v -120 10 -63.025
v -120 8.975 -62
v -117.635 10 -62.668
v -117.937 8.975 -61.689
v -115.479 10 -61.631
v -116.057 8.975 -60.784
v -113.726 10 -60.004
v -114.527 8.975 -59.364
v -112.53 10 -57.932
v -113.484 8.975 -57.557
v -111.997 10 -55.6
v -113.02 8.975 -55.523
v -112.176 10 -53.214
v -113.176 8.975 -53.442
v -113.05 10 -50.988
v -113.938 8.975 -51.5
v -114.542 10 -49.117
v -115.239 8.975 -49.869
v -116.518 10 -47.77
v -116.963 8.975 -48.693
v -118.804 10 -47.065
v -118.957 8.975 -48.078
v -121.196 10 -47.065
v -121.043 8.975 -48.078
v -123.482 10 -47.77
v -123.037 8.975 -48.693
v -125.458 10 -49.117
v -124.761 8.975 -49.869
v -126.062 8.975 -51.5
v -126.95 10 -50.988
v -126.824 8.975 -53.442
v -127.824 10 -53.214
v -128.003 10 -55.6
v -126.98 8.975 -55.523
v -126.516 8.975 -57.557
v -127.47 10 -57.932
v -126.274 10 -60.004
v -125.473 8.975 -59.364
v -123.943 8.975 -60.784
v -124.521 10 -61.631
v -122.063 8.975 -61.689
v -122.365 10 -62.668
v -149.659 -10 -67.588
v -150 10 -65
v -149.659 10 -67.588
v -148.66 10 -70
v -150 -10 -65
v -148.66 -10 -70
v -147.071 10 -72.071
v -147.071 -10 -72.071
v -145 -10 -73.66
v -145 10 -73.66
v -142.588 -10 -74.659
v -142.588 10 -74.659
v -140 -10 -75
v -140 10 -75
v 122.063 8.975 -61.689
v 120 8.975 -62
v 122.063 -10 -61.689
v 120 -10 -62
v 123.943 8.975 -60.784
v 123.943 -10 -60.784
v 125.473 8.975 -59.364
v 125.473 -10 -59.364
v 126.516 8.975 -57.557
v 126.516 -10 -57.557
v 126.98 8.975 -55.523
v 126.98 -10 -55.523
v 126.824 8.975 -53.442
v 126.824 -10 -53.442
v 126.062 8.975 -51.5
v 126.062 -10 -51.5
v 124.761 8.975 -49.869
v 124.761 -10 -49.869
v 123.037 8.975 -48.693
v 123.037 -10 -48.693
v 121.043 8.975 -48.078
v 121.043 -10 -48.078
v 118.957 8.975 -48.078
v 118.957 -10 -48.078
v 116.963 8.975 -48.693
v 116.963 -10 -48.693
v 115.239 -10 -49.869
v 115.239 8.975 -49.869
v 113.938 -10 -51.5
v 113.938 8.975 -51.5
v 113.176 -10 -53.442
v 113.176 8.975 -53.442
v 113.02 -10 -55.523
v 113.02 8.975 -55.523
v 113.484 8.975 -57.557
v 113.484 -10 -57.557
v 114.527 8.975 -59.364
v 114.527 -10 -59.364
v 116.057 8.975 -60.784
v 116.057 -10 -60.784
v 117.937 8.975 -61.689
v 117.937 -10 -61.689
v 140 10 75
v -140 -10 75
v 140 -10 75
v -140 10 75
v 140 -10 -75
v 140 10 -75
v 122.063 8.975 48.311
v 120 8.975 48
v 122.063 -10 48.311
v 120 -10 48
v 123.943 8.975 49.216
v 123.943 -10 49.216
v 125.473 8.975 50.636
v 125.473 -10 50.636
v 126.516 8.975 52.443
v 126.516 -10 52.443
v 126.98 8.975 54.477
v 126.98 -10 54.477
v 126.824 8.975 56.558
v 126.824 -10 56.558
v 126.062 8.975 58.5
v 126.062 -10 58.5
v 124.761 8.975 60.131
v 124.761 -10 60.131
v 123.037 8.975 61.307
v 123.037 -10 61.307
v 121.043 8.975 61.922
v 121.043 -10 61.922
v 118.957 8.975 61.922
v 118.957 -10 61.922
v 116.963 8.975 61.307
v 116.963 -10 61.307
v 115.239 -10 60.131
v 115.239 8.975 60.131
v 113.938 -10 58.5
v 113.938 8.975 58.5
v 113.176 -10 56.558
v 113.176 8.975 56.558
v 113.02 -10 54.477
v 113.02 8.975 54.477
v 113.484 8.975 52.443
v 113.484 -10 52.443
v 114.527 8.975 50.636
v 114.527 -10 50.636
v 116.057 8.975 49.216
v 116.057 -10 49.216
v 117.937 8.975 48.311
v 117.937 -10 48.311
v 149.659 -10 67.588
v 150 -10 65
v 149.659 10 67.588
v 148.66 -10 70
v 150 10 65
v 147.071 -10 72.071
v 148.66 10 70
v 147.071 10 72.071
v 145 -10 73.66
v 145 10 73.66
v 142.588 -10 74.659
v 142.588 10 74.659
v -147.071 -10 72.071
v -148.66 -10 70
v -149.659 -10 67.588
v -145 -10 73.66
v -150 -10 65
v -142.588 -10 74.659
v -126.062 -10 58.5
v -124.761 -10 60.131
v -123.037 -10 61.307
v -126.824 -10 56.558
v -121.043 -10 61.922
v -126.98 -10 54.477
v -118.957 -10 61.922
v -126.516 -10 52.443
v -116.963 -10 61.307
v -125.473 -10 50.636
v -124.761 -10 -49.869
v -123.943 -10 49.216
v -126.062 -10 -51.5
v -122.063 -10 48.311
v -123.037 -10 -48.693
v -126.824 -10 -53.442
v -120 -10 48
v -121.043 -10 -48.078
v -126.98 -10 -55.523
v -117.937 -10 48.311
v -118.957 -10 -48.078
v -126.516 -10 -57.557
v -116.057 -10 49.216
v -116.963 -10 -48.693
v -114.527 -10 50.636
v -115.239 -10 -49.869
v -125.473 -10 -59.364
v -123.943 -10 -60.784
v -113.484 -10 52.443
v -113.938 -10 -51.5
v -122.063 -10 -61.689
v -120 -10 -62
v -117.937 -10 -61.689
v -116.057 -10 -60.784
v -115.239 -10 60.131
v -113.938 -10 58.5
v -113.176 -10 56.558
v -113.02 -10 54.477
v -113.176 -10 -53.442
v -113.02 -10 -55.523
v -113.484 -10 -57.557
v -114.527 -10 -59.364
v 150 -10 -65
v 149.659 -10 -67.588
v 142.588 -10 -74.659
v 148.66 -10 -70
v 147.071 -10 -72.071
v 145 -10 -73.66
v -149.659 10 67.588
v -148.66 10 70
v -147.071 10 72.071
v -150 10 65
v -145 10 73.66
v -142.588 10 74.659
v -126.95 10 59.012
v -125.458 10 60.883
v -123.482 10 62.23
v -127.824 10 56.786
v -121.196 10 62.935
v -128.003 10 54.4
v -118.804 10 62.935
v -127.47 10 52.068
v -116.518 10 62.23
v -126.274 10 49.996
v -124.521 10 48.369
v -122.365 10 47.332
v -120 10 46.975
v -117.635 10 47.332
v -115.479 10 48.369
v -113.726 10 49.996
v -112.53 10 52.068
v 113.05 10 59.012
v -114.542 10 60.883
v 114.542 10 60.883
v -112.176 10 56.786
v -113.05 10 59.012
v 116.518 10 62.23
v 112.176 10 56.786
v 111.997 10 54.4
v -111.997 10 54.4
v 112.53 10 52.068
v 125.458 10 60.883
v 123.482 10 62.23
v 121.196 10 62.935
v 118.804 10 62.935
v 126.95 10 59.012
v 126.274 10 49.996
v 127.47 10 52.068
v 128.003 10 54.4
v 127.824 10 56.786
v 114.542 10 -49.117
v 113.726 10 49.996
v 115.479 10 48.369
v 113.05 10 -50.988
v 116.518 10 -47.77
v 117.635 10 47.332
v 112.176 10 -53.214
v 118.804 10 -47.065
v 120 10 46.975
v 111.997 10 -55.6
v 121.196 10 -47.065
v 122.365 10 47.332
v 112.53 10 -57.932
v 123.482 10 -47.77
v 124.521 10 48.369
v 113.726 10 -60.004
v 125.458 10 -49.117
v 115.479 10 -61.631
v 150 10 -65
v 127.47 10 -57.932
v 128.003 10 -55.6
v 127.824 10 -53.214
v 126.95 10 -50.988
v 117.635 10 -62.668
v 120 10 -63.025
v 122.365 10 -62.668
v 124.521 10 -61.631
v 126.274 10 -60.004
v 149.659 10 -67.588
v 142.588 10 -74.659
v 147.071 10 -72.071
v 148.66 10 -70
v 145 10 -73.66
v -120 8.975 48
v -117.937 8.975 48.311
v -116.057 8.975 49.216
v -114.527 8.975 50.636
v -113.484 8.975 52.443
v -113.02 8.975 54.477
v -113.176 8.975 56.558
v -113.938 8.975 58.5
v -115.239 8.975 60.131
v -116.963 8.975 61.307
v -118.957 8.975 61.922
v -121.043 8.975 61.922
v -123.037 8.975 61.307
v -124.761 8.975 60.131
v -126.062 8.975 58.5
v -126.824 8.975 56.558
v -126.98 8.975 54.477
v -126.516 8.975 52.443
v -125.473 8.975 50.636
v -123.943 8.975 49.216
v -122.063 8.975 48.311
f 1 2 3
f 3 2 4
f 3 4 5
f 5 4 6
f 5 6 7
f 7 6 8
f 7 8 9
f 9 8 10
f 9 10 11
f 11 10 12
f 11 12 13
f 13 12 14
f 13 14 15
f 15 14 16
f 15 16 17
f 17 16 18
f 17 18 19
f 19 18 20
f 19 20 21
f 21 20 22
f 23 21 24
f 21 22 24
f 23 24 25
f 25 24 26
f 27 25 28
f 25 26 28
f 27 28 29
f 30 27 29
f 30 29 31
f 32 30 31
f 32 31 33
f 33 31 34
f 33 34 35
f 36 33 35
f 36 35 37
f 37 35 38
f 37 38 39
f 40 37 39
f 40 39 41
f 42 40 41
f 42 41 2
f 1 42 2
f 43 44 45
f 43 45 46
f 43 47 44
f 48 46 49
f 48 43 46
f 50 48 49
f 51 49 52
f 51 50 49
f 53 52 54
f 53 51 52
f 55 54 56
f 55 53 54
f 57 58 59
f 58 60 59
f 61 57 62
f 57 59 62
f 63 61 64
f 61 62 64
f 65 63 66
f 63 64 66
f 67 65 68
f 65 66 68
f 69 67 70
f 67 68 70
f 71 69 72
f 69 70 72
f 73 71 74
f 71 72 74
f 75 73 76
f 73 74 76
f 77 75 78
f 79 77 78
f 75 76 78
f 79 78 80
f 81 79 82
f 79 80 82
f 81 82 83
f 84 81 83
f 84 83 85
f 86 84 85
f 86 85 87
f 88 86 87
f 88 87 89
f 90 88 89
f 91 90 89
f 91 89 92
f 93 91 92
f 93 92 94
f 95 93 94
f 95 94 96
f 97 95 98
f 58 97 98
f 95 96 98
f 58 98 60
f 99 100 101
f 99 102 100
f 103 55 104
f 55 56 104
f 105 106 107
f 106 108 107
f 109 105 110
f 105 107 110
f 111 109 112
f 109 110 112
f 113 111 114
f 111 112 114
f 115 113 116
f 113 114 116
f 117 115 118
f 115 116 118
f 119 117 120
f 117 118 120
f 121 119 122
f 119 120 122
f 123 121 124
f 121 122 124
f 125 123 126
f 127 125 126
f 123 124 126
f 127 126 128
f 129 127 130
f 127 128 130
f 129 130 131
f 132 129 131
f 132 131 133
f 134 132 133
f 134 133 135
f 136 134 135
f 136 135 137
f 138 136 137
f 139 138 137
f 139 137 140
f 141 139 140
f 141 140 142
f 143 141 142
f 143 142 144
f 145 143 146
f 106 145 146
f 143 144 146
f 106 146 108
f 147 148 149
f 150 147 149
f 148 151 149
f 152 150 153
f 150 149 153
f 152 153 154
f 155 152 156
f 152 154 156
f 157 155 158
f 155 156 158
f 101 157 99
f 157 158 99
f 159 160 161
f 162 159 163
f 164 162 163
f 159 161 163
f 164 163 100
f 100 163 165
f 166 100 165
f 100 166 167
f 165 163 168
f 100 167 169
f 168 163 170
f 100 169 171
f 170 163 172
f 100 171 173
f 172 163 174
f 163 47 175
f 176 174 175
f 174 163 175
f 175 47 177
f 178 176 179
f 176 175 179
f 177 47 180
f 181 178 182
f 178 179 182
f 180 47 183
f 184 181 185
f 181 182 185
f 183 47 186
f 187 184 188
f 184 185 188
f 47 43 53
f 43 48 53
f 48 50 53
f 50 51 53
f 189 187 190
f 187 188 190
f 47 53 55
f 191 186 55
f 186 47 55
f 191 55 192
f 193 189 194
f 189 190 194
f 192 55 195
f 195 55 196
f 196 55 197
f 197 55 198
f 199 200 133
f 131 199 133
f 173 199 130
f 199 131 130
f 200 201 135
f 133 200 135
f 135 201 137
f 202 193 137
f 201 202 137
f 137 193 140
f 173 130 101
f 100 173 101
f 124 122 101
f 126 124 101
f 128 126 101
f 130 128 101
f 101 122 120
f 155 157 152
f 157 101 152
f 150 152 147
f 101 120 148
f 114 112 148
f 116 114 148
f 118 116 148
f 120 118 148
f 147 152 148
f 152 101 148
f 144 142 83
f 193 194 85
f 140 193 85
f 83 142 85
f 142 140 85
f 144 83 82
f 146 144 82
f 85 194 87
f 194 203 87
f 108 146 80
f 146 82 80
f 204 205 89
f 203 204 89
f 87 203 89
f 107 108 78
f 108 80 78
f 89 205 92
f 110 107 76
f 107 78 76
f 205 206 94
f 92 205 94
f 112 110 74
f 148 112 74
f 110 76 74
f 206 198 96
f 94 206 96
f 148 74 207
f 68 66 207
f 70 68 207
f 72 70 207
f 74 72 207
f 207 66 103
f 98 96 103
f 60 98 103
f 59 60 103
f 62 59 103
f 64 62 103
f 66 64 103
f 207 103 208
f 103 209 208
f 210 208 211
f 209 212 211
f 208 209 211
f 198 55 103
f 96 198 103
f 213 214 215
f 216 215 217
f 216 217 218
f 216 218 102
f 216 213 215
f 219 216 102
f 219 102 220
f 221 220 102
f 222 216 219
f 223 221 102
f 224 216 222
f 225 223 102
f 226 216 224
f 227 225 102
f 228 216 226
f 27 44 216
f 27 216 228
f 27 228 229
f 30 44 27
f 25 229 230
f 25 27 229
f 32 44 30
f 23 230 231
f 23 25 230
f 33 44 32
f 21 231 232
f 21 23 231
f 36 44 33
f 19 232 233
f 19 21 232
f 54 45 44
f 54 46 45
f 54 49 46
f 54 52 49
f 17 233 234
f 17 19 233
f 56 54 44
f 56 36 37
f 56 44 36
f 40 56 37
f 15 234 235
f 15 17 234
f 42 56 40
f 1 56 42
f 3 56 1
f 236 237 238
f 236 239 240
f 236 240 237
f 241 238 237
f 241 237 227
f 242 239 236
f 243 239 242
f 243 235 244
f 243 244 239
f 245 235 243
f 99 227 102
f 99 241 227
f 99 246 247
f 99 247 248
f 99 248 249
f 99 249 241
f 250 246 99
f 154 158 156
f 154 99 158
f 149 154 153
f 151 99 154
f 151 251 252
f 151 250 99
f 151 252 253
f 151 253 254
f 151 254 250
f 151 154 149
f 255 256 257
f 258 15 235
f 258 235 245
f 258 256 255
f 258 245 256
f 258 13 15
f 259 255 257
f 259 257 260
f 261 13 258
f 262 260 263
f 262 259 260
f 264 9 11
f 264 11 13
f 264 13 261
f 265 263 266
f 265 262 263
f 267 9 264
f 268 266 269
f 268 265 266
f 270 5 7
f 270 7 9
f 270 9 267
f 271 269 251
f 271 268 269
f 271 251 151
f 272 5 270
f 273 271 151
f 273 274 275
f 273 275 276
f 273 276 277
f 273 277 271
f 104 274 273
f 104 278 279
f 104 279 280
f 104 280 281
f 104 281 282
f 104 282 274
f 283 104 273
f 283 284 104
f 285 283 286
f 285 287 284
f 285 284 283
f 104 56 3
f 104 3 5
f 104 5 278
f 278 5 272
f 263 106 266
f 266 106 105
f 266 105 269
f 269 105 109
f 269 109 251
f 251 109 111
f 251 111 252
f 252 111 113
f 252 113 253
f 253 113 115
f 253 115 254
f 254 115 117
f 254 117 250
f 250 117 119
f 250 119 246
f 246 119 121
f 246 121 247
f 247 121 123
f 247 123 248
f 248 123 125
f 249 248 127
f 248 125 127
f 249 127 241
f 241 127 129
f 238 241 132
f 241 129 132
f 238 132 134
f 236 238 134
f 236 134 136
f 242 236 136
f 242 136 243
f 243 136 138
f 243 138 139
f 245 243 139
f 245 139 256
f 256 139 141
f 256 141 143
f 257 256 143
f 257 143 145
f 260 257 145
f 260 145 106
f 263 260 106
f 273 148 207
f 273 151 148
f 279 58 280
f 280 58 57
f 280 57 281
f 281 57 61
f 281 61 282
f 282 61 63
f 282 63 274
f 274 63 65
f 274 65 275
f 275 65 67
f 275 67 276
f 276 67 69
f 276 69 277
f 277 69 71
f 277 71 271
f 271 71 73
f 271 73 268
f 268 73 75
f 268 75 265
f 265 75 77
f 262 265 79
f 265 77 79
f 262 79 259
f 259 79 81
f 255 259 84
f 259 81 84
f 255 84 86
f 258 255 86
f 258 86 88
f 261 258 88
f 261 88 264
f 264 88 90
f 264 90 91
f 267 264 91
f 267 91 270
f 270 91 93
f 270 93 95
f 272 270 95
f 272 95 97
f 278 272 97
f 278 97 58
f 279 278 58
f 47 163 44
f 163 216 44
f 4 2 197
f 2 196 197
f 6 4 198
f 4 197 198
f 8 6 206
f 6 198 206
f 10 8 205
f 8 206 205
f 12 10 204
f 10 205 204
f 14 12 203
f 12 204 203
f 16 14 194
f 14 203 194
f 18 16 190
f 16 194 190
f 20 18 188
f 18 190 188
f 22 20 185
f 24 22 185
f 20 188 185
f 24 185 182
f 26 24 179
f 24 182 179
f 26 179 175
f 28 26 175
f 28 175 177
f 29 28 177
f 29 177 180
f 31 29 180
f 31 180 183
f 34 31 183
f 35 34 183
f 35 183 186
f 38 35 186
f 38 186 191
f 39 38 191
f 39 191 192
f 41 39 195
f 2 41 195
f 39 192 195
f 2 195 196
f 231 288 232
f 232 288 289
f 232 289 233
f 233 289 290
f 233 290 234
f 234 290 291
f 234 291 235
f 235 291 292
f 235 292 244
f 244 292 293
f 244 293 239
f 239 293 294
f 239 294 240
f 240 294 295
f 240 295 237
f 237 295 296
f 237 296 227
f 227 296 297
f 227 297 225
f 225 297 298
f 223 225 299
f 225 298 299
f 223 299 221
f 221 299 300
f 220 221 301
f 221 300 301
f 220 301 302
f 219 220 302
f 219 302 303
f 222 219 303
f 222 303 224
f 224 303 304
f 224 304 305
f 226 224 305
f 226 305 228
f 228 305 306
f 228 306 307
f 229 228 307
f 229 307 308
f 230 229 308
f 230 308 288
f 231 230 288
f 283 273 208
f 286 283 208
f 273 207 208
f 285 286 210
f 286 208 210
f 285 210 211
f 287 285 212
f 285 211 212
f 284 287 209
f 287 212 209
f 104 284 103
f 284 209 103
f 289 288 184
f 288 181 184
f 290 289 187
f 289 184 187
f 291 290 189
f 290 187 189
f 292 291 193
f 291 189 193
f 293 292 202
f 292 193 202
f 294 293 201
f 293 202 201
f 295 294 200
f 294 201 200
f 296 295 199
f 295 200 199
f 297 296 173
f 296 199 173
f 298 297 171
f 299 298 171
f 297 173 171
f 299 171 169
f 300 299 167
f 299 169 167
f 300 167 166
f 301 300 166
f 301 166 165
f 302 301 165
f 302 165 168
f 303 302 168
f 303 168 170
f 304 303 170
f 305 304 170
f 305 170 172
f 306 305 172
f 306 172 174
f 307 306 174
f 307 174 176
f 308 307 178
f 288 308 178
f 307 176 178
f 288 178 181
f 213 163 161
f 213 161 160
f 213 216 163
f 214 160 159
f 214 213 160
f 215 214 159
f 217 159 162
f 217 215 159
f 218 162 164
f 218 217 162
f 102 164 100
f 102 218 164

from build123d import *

# Parameters (mm, degrees)
SKETCH2_W                    = 300
SKETCH2_H                    = 150
BOSS_EXTRUDE1_DEPTH          = 10
FILLET1_R                    = 10
M16_TAPPED_HOLE1_D           = 14
M16_TAPPED_HOLE1_CSINK_D     = 16.05
M16_TAPPED_HOLE1_CSINK_ANGLE = 90


with BuildPart() as part:
    # Sketch2 → Boss-Extrude1 (new, symmetric)
    with BuildSketch(Plane(origin=(0, 0, 0), x_dir=(1, 0, 0), z_dir=(0, 1, 0))):
        Rectangle(SKETCH2_W, SKETCH2_H)
    extrude(amount=BOSS_EXTRUDE1_DEPTH, both=True)

    # Fillet1
    fillet1_edges = [part.edges().sort_by_distance(p)[0] for p in [
        (150, 0, 75),
        (-150, 0, 75),
        (-150, 0, -75),
        (150, 0, -75),
    ]]
    fillet(fillet1_edges, radius=FILLET1_R)

    # M16 Tapped Hole1 (through all)
    with Locations(Plane(origin=(-120, 10, -55), x_dir=(0, 0, 1), z_dir=(0, 1, 0))):
        with Locations((0, 0), (0, 240), (110, 240), (110, 0)):
            CounterSinkHole(M16_TAPPED_HOLE1_D / 2, M16_TAPPED_HOLE1_CSINK_D / 2, counter_sink_angle=M16_TAPPED_HOLE1_CSINK_ANGLE)


solid = part.part
